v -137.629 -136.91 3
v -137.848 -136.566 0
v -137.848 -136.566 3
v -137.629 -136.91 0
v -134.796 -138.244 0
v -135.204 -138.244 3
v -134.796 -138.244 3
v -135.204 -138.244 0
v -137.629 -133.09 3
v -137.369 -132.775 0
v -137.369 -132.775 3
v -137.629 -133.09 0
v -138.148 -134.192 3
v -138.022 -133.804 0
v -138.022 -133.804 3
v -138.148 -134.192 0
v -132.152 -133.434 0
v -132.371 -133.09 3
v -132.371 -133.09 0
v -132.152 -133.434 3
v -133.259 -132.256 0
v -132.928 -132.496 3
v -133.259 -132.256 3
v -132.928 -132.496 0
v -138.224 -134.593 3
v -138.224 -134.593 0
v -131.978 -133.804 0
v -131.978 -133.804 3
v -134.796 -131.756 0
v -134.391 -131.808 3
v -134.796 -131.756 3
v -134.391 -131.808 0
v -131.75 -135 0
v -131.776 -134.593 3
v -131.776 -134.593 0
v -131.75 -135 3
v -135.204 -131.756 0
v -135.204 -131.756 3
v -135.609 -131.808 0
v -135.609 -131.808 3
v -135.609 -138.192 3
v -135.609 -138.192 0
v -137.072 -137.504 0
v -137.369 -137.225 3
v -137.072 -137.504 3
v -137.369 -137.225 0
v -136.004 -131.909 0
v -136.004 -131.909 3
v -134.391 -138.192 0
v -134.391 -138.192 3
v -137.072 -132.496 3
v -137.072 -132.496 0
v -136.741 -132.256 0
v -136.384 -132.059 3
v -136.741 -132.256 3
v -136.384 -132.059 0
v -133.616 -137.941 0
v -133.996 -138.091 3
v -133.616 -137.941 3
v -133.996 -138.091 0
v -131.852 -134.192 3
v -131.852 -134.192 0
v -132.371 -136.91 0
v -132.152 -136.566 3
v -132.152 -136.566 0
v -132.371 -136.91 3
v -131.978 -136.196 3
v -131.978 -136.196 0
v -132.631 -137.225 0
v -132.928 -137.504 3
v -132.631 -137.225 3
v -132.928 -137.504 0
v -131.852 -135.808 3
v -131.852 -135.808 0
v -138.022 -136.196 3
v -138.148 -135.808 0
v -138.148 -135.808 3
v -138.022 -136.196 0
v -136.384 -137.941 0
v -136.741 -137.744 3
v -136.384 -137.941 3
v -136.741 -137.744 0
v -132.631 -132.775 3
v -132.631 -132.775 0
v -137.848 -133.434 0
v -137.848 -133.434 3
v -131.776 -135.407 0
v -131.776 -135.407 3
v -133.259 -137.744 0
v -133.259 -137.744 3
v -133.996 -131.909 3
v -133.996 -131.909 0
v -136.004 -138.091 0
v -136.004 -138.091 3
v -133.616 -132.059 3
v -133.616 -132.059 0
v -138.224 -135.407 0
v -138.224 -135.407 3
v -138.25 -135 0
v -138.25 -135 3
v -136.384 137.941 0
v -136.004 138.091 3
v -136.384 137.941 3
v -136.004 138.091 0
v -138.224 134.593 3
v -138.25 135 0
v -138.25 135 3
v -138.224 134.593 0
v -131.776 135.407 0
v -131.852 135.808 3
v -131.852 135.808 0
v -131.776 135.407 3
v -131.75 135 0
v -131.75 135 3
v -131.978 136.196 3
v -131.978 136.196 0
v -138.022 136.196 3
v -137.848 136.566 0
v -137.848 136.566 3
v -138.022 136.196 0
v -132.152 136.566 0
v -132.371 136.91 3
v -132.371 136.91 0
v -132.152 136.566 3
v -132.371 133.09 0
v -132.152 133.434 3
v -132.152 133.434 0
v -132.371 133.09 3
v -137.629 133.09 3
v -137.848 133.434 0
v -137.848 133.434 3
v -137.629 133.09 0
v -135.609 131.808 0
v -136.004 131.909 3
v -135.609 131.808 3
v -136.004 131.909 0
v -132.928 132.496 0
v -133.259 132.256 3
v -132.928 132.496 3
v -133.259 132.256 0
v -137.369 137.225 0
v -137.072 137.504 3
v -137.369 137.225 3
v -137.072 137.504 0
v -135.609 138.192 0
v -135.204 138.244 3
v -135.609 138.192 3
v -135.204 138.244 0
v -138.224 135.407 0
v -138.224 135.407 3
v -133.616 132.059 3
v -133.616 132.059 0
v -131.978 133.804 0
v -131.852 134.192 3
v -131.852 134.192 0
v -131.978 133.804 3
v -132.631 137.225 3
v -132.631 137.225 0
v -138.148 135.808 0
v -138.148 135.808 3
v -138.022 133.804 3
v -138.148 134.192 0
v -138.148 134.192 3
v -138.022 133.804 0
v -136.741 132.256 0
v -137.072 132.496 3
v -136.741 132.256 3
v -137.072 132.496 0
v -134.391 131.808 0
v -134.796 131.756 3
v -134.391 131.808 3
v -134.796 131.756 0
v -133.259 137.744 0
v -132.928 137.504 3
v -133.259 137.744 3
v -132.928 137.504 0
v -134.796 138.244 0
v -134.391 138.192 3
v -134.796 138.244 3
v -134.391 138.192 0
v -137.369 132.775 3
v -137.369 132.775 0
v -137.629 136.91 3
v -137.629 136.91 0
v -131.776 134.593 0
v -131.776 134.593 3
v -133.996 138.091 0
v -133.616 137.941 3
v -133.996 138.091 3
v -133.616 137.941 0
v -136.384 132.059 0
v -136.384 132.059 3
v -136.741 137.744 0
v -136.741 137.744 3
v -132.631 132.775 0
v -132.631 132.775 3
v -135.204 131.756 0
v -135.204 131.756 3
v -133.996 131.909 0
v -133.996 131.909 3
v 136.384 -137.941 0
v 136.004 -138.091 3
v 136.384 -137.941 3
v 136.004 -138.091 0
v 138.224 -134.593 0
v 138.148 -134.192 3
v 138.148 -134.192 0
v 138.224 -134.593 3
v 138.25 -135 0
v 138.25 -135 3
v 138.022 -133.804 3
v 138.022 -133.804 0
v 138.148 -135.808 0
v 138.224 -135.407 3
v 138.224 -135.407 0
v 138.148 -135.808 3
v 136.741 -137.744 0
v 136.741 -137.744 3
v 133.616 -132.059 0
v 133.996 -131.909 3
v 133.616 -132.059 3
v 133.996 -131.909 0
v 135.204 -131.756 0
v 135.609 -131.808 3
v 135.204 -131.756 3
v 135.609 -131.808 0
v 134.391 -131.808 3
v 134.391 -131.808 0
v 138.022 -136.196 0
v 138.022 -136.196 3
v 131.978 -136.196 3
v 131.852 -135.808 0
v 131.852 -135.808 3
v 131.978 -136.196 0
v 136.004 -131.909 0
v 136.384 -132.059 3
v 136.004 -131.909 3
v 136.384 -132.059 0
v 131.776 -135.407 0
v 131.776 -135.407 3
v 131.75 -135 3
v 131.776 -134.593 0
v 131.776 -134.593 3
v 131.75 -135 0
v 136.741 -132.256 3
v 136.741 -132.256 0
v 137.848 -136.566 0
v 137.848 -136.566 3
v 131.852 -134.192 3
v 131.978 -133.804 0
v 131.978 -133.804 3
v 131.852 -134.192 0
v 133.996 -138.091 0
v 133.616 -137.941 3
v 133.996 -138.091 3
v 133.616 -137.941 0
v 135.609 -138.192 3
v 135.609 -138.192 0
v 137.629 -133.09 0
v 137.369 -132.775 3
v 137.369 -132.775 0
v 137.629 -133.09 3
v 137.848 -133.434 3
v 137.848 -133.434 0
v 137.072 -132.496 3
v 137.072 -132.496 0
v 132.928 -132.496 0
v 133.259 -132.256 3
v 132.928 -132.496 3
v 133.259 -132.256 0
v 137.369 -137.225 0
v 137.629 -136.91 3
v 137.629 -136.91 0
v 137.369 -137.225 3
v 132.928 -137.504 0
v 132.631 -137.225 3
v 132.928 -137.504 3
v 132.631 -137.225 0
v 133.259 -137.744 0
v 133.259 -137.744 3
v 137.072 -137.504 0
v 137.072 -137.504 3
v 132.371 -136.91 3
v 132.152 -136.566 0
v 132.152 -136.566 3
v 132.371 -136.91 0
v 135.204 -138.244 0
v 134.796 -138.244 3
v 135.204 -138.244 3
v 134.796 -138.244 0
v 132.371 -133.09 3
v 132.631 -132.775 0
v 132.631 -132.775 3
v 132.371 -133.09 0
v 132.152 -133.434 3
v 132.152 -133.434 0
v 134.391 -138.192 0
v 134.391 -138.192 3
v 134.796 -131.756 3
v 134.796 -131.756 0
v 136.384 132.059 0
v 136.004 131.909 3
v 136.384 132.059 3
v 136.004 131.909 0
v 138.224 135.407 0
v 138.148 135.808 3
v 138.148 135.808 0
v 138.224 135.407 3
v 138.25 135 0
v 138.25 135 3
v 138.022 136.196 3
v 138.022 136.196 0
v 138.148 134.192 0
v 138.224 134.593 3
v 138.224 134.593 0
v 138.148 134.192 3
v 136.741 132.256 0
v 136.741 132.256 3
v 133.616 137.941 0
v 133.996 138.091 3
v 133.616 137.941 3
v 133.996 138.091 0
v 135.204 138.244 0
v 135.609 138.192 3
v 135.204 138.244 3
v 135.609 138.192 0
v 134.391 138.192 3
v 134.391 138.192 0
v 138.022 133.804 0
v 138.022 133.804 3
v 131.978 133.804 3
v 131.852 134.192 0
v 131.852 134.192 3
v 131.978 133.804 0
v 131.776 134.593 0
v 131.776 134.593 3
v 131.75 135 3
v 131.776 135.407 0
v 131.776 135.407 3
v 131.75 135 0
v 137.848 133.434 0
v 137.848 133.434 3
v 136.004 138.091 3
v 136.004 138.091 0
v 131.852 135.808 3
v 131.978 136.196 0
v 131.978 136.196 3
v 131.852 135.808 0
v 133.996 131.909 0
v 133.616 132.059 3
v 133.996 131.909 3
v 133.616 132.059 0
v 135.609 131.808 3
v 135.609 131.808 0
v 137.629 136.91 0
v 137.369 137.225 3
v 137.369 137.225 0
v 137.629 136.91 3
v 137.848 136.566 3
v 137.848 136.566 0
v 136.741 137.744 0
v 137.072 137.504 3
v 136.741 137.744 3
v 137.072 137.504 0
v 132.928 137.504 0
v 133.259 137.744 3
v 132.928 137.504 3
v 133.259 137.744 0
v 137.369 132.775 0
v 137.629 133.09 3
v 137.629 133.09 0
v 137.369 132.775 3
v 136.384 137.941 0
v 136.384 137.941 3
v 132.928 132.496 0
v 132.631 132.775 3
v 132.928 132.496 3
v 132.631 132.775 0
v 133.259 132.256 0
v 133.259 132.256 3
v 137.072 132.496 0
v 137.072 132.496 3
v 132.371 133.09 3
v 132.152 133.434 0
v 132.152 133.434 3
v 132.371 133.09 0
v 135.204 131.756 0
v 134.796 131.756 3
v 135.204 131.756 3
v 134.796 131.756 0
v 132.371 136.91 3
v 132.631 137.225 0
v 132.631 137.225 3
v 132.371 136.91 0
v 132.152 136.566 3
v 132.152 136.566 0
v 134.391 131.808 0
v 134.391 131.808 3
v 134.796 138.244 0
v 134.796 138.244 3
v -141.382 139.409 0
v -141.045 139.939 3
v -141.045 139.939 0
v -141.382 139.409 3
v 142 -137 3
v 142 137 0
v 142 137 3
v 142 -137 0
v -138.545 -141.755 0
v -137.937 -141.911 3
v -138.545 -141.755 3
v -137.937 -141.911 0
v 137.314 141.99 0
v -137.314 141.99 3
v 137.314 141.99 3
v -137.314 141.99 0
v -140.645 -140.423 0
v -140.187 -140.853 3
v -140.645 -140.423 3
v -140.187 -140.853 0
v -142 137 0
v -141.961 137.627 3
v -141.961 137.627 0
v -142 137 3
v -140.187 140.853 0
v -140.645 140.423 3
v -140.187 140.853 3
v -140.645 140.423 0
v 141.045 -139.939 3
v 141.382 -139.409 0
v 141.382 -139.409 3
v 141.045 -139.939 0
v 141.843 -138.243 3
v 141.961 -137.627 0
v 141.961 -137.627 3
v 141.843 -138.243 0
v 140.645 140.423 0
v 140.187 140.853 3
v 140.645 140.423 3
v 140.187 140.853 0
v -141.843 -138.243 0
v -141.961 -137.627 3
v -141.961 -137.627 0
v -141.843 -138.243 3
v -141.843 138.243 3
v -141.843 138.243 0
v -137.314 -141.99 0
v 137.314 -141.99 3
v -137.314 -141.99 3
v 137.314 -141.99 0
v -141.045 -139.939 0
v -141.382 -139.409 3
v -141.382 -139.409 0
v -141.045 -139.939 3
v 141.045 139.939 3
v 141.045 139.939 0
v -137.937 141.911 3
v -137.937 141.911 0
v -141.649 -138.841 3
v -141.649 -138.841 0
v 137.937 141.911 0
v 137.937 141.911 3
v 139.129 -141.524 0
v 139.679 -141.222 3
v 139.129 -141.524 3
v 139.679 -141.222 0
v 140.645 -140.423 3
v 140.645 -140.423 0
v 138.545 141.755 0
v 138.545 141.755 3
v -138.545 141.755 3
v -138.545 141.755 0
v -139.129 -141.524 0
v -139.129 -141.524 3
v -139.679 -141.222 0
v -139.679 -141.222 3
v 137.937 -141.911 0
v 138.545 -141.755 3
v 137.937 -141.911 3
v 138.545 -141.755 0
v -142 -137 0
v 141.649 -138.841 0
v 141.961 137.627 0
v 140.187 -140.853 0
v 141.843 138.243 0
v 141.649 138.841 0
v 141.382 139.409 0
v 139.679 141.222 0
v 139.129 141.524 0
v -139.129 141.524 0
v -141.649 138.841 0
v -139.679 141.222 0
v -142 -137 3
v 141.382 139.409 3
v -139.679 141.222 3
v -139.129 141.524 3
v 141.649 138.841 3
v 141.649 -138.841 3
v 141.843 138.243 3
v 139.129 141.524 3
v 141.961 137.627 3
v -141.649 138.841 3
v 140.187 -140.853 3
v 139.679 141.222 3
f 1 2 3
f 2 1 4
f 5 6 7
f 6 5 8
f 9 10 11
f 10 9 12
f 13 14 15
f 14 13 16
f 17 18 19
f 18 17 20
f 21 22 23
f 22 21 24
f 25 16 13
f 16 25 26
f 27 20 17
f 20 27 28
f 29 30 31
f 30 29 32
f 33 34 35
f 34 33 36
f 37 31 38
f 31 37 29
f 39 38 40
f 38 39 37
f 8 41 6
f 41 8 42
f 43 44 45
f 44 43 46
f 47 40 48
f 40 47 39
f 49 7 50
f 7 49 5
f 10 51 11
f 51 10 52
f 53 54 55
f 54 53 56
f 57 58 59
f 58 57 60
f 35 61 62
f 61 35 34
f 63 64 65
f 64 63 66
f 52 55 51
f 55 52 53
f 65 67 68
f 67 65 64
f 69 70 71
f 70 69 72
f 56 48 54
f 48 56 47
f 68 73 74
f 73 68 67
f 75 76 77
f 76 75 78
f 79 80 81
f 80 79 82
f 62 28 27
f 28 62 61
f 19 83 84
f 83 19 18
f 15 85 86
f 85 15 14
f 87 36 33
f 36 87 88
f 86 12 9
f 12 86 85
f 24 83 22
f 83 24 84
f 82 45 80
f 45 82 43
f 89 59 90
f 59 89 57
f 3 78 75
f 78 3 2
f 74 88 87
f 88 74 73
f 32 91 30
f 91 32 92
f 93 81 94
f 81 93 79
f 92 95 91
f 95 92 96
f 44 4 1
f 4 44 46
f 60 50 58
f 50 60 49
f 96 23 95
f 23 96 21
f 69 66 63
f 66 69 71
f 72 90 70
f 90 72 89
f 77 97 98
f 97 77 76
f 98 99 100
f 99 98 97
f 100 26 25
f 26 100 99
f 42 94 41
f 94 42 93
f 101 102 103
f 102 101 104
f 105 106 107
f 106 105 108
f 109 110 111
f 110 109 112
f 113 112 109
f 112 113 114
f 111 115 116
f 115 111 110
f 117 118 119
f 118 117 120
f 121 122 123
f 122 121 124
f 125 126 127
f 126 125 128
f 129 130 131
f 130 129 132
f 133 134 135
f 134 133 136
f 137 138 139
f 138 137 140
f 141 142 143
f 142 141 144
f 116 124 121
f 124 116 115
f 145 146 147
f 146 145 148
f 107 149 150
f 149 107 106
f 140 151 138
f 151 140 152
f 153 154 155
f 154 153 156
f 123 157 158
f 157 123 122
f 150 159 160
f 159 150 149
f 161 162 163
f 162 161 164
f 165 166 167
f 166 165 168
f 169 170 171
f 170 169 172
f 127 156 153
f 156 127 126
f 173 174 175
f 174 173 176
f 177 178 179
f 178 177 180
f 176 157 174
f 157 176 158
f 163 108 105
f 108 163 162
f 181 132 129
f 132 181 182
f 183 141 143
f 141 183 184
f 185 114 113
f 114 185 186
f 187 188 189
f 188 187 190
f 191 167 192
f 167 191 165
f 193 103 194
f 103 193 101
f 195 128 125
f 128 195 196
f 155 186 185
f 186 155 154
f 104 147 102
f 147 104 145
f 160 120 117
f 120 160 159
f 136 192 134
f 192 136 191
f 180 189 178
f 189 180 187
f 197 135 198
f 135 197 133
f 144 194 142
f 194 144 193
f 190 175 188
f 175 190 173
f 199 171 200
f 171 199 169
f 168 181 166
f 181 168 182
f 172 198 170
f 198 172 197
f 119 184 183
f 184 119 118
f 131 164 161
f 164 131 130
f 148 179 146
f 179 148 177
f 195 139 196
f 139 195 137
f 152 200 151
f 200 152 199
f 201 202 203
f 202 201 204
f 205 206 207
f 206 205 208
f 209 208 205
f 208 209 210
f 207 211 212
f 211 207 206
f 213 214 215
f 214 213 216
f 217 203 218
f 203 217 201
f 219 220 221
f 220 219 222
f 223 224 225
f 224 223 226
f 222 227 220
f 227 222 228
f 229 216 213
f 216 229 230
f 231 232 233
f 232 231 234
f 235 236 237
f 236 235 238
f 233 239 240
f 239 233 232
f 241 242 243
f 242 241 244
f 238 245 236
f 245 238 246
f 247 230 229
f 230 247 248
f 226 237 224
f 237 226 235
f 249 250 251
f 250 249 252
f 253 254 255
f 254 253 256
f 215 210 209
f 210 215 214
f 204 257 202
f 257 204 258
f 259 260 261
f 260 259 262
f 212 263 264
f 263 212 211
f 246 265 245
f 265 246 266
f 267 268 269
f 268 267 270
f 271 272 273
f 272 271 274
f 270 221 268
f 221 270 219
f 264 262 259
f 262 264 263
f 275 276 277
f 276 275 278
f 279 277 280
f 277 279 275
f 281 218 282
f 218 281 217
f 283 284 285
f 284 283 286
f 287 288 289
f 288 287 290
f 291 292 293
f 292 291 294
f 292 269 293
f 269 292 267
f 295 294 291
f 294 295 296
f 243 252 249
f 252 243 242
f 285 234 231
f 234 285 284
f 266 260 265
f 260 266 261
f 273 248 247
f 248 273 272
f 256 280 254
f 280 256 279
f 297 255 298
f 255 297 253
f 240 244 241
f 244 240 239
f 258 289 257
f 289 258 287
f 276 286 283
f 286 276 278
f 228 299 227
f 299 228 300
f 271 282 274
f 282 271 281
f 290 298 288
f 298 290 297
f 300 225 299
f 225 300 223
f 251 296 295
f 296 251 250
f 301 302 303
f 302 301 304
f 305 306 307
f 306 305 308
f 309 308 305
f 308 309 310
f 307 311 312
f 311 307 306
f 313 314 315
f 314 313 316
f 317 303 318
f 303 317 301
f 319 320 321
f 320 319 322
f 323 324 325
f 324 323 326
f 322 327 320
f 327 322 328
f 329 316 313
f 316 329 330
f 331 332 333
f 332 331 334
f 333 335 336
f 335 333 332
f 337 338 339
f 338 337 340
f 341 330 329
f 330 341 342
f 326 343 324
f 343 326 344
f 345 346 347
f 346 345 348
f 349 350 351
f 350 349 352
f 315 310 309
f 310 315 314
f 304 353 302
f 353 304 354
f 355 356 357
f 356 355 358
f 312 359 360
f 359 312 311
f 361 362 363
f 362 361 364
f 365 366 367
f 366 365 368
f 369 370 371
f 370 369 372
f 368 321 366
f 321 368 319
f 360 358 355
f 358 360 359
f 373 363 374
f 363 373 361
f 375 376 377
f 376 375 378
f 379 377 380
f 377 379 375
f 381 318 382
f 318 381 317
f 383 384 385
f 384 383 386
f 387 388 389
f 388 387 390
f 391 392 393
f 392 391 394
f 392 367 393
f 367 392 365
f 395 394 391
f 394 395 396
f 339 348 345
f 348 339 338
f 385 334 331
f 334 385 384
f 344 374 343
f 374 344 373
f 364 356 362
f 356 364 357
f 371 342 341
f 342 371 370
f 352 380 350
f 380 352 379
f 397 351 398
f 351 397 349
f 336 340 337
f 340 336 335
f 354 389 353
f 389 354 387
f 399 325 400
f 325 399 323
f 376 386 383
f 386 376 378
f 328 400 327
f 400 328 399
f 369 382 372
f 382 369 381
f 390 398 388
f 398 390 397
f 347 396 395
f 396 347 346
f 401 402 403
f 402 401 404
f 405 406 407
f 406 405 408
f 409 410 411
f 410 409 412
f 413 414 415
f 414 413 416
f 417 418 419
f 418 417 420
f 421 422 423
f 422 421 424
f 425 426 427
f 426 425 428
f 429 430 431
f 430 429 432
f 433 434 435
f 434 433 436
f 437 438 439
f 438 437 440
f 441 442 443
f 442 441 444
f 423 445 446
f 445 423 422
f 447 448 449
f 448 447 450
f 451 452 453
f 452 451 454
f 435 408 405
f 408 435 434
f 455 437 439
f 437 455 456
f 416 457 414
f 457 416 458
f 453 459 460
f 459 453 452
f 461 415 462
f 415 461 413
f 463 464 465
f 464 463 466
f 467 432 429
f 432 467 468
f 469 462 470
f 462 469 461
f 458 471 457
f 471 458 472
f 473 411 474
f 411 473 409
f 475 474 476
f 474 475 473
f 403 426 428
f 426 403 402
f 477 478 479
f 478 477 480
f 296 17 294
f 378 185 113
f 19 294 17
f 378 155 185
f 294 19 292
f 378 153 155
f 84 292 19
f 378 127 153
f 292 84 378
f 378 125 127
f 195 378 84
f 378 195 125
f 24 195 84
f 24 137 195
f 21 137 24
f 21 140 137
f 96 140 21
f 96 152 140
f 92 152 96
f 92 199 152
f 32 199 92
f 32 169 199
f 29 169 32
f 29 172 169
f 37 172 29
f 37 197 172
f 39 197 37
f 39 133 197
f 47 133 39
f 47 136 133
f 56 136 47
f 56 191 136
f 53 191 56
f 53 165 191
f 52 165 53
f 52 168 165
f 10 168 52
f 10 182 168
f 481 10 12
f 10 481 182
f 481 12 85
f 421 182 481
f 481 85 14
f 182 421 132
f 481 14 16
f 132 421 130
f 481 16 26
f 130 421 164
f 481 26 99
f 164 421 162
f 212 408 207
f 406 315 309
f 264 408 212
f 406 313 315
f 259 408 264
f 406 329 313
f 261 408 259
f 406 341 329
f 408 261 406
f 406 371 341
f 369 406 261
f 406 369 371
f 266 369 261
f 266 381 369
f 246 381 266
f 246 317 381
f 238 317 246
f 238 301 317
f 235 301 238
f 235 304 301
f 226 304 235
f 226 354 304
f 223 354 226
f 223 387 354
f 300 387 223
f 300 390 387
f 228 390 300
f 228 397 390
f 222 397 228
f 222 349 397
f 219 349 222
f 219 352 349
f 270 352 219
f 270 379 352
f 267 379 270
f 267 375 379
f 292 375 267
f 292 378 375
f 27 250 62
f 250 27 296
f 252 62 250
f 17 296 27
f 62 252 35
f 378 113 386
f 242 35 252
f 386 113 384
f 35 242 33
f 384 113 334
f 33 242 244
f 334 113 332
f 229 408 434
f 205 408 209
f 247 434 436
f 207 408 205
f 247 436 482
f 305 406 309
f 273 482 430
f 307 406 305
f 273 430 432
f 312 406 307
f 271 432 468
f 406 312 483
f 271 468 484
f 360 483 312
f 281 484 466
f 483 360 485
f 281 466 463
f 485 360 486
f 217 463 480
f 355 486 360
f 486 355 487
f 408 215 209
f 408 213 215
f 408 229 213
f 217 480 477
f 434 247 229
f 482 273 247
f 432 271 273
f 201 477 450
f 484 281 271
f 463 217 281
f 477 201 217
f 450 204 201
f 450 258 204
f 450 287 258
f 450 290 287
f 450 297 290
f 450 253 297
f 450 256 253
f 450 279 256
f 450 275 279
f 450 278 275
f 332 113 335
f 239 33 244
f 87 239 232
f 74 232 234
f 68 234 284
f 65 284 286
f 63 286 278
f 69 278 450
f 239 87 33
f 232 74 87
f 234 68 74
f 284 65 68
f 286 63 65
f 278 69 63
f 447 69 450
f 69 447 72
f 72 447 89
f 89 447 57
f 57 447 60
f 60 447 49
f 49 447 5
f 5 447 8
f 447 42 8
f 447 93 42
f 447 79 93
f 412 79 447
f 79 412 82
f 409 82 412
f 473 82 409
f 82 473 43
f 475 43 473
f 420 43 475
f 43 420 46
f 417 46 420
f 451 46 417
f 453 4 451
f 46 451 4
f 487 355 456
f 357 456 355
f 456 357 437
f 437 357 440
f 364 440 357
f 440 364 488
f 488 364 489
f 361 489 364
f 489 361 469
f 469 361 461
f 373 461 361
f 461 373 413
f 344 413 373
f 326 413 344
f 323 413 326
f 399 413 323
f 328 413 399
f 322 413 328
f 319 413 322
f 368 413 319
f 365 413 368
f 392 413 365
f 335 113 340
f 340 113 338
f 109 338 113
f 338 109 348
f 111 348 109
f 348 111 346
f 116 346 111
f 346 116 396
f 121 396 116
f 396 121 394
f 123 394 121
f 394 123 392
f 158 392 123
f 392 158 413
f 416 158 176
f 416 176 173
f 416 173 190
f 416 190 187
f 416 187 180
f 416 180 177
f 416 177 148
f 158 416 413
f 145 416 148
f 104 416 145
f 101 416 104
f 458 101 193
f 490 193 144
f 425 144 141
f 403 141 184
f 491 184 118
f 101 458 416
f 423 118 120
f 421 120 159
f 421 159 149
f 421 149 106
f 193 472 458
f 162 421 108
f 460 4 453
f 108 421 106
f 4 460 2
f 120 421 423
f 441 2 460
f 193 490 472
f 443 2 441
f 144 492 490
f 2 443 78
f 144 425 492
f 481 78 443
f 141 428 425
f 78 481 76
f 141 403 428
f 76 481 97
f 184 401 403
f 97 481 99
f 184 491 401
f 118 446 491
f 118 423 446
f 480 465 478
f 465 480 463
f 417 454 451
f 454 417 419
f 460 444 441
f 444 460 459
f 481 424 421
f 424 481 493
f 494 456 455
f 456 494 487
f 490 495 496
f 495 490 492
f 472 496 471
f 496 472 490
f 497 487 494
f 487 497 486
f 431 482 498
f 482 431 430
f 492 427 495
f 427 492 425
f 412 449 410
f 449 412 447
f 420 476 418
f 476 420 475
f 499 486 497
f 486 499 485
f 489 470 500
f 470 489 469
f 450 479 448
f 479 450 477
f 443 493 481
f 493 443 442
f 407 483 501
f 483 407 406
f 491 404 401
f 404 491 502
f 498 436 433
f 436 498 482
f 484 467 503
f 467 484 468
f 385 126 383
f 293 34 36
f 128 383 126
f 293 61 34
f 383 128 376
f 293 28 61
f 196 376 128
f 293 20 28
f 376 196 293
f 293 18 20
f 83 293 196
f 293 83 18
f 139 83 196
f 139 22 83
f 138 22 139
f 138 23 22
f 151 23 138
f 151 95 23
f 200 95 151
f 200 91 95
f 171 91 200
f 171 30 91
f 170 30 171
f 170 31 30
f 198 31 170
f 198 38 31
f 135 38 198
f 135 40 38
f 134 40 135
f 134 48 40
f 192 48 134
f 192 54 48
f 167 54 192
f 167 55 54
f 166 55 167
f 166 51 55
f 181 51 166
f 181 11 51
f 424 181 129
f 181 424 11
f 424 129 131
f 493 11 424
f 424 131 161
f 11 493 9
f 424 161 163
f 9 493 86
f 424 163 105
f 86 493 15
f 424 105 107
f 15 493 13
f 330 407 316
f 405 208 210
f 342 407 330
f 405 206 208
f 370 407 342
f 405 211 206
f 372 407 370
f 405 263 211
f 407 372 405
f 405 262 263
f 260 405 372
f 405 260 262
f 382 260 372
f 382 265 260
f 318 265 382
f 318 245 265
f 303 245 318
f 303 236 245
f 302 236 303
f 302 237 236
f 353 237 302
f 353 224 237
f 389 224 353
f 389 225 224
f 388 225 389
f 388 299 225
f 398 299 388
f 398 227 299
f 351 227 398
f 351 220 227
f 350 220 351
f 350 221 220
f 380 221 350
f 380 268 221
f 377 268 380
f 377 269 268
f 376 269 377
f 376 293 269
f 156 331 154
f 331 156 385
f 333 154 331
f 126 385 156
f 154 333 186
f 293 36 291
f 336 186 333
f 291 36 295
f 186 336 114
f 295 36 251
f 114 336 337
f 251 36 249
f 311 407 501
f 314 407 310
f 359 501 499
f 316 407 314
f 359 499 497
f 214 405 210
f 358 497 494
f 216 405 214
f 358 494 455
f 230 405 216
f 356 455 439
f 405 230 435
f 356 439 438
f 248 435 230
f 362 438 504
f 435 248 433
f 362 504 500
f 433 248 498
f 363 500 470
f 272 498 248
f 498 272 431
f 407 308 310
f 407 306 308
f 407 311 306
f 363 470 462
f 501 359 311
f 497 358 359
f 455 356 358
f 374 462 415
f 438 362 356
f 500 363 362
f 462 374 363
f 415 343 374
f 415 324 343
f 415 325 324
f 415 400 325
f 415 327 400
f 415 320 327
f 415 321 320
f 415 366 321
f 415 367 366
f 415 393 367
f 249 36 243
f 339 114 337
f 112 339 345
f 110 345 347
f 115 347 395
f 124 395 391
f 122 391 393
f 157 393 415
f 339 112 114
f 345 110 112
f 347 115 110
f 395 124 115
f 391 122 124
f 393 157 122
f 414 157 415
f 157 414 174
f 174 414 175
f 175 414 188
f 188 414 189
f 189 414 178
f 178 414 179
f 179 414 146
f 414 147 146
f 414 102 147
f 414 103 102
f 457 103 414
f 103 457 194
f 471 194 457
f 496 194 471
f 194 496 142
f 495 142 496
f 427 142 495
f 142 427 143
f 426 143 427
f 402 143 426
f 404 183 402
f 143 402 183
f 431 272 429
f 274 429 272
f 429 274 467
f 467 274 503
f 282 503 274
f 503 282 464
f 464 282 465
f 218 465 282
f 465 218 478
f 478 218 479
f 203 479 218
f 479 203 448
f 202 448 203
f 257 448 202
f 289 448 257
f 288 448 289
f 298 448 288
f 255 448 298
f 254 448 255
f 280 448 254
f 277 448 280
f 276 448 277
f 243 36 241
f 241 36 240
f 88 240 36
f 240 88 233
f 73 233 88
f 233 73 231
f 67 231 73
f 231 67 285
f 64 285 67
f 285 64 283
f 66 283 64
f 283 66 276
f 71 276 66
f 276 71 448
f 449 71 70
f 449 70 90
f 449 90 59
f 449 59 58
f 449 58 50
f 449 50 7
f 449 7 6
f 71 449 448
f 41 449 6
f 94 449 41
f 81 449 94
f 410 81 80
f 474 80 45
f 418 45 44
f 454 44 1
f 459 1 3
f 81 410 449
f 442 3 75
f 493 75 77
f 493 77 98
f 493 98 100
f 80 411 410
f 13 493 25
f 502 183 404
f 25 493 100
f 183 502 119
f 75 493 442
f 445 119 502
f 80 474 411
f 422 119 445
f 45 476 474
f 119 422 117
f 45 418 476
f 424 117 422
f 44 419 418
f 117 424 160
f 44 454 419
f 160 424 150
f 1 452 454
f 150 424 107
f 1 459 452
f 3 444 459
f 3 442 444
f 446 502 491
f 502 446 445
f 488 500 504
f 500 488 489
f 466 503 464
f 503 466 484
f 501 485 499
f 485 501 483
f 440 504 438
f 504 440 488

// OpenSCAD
$fn = 50;


difference() {
	union() {
		hull() {
			translate(v = [-137.0000000000, 137.0000000000, 0]) {
				cylinder(h = 3, r = 5);
			}
			translate(v = [137.0000000000, 137.0000000000, 0]) {
				cylinder(h = 3, r = 5);
			}
			translate(v = [-137.0000000000, -137.0000000000, 0]) {
				cylinder(h = 3, r = 5);
			}
			translate(v = [137.0000000000, -137.0000000000, 0]) {
				cylinder(h = 3, r = 5);
			}
		}
	}
	union() {
		translate(v = [-135.0000000000, -135.0000000000, -100.0000000000]) {
			cylinder(h = 200, r = 3.2500000000);
		}
		translate(v = [-135.0000000000, 135.0000000000, -100.0000000000]) {
			cylinder(h = 200, r = 3.2500000000);
		}
		translate(v = [135.0000000000, -135.0000000000, -100.0000000000]) {
			cylinder(h = 200, r = 3.2500000000);
		}
		translate(v = [135.0000000000, 135.0000000000, -100.0000000000]) {
			cylinder(h = 200, r = 3.2500000000);
		}
	}
}
